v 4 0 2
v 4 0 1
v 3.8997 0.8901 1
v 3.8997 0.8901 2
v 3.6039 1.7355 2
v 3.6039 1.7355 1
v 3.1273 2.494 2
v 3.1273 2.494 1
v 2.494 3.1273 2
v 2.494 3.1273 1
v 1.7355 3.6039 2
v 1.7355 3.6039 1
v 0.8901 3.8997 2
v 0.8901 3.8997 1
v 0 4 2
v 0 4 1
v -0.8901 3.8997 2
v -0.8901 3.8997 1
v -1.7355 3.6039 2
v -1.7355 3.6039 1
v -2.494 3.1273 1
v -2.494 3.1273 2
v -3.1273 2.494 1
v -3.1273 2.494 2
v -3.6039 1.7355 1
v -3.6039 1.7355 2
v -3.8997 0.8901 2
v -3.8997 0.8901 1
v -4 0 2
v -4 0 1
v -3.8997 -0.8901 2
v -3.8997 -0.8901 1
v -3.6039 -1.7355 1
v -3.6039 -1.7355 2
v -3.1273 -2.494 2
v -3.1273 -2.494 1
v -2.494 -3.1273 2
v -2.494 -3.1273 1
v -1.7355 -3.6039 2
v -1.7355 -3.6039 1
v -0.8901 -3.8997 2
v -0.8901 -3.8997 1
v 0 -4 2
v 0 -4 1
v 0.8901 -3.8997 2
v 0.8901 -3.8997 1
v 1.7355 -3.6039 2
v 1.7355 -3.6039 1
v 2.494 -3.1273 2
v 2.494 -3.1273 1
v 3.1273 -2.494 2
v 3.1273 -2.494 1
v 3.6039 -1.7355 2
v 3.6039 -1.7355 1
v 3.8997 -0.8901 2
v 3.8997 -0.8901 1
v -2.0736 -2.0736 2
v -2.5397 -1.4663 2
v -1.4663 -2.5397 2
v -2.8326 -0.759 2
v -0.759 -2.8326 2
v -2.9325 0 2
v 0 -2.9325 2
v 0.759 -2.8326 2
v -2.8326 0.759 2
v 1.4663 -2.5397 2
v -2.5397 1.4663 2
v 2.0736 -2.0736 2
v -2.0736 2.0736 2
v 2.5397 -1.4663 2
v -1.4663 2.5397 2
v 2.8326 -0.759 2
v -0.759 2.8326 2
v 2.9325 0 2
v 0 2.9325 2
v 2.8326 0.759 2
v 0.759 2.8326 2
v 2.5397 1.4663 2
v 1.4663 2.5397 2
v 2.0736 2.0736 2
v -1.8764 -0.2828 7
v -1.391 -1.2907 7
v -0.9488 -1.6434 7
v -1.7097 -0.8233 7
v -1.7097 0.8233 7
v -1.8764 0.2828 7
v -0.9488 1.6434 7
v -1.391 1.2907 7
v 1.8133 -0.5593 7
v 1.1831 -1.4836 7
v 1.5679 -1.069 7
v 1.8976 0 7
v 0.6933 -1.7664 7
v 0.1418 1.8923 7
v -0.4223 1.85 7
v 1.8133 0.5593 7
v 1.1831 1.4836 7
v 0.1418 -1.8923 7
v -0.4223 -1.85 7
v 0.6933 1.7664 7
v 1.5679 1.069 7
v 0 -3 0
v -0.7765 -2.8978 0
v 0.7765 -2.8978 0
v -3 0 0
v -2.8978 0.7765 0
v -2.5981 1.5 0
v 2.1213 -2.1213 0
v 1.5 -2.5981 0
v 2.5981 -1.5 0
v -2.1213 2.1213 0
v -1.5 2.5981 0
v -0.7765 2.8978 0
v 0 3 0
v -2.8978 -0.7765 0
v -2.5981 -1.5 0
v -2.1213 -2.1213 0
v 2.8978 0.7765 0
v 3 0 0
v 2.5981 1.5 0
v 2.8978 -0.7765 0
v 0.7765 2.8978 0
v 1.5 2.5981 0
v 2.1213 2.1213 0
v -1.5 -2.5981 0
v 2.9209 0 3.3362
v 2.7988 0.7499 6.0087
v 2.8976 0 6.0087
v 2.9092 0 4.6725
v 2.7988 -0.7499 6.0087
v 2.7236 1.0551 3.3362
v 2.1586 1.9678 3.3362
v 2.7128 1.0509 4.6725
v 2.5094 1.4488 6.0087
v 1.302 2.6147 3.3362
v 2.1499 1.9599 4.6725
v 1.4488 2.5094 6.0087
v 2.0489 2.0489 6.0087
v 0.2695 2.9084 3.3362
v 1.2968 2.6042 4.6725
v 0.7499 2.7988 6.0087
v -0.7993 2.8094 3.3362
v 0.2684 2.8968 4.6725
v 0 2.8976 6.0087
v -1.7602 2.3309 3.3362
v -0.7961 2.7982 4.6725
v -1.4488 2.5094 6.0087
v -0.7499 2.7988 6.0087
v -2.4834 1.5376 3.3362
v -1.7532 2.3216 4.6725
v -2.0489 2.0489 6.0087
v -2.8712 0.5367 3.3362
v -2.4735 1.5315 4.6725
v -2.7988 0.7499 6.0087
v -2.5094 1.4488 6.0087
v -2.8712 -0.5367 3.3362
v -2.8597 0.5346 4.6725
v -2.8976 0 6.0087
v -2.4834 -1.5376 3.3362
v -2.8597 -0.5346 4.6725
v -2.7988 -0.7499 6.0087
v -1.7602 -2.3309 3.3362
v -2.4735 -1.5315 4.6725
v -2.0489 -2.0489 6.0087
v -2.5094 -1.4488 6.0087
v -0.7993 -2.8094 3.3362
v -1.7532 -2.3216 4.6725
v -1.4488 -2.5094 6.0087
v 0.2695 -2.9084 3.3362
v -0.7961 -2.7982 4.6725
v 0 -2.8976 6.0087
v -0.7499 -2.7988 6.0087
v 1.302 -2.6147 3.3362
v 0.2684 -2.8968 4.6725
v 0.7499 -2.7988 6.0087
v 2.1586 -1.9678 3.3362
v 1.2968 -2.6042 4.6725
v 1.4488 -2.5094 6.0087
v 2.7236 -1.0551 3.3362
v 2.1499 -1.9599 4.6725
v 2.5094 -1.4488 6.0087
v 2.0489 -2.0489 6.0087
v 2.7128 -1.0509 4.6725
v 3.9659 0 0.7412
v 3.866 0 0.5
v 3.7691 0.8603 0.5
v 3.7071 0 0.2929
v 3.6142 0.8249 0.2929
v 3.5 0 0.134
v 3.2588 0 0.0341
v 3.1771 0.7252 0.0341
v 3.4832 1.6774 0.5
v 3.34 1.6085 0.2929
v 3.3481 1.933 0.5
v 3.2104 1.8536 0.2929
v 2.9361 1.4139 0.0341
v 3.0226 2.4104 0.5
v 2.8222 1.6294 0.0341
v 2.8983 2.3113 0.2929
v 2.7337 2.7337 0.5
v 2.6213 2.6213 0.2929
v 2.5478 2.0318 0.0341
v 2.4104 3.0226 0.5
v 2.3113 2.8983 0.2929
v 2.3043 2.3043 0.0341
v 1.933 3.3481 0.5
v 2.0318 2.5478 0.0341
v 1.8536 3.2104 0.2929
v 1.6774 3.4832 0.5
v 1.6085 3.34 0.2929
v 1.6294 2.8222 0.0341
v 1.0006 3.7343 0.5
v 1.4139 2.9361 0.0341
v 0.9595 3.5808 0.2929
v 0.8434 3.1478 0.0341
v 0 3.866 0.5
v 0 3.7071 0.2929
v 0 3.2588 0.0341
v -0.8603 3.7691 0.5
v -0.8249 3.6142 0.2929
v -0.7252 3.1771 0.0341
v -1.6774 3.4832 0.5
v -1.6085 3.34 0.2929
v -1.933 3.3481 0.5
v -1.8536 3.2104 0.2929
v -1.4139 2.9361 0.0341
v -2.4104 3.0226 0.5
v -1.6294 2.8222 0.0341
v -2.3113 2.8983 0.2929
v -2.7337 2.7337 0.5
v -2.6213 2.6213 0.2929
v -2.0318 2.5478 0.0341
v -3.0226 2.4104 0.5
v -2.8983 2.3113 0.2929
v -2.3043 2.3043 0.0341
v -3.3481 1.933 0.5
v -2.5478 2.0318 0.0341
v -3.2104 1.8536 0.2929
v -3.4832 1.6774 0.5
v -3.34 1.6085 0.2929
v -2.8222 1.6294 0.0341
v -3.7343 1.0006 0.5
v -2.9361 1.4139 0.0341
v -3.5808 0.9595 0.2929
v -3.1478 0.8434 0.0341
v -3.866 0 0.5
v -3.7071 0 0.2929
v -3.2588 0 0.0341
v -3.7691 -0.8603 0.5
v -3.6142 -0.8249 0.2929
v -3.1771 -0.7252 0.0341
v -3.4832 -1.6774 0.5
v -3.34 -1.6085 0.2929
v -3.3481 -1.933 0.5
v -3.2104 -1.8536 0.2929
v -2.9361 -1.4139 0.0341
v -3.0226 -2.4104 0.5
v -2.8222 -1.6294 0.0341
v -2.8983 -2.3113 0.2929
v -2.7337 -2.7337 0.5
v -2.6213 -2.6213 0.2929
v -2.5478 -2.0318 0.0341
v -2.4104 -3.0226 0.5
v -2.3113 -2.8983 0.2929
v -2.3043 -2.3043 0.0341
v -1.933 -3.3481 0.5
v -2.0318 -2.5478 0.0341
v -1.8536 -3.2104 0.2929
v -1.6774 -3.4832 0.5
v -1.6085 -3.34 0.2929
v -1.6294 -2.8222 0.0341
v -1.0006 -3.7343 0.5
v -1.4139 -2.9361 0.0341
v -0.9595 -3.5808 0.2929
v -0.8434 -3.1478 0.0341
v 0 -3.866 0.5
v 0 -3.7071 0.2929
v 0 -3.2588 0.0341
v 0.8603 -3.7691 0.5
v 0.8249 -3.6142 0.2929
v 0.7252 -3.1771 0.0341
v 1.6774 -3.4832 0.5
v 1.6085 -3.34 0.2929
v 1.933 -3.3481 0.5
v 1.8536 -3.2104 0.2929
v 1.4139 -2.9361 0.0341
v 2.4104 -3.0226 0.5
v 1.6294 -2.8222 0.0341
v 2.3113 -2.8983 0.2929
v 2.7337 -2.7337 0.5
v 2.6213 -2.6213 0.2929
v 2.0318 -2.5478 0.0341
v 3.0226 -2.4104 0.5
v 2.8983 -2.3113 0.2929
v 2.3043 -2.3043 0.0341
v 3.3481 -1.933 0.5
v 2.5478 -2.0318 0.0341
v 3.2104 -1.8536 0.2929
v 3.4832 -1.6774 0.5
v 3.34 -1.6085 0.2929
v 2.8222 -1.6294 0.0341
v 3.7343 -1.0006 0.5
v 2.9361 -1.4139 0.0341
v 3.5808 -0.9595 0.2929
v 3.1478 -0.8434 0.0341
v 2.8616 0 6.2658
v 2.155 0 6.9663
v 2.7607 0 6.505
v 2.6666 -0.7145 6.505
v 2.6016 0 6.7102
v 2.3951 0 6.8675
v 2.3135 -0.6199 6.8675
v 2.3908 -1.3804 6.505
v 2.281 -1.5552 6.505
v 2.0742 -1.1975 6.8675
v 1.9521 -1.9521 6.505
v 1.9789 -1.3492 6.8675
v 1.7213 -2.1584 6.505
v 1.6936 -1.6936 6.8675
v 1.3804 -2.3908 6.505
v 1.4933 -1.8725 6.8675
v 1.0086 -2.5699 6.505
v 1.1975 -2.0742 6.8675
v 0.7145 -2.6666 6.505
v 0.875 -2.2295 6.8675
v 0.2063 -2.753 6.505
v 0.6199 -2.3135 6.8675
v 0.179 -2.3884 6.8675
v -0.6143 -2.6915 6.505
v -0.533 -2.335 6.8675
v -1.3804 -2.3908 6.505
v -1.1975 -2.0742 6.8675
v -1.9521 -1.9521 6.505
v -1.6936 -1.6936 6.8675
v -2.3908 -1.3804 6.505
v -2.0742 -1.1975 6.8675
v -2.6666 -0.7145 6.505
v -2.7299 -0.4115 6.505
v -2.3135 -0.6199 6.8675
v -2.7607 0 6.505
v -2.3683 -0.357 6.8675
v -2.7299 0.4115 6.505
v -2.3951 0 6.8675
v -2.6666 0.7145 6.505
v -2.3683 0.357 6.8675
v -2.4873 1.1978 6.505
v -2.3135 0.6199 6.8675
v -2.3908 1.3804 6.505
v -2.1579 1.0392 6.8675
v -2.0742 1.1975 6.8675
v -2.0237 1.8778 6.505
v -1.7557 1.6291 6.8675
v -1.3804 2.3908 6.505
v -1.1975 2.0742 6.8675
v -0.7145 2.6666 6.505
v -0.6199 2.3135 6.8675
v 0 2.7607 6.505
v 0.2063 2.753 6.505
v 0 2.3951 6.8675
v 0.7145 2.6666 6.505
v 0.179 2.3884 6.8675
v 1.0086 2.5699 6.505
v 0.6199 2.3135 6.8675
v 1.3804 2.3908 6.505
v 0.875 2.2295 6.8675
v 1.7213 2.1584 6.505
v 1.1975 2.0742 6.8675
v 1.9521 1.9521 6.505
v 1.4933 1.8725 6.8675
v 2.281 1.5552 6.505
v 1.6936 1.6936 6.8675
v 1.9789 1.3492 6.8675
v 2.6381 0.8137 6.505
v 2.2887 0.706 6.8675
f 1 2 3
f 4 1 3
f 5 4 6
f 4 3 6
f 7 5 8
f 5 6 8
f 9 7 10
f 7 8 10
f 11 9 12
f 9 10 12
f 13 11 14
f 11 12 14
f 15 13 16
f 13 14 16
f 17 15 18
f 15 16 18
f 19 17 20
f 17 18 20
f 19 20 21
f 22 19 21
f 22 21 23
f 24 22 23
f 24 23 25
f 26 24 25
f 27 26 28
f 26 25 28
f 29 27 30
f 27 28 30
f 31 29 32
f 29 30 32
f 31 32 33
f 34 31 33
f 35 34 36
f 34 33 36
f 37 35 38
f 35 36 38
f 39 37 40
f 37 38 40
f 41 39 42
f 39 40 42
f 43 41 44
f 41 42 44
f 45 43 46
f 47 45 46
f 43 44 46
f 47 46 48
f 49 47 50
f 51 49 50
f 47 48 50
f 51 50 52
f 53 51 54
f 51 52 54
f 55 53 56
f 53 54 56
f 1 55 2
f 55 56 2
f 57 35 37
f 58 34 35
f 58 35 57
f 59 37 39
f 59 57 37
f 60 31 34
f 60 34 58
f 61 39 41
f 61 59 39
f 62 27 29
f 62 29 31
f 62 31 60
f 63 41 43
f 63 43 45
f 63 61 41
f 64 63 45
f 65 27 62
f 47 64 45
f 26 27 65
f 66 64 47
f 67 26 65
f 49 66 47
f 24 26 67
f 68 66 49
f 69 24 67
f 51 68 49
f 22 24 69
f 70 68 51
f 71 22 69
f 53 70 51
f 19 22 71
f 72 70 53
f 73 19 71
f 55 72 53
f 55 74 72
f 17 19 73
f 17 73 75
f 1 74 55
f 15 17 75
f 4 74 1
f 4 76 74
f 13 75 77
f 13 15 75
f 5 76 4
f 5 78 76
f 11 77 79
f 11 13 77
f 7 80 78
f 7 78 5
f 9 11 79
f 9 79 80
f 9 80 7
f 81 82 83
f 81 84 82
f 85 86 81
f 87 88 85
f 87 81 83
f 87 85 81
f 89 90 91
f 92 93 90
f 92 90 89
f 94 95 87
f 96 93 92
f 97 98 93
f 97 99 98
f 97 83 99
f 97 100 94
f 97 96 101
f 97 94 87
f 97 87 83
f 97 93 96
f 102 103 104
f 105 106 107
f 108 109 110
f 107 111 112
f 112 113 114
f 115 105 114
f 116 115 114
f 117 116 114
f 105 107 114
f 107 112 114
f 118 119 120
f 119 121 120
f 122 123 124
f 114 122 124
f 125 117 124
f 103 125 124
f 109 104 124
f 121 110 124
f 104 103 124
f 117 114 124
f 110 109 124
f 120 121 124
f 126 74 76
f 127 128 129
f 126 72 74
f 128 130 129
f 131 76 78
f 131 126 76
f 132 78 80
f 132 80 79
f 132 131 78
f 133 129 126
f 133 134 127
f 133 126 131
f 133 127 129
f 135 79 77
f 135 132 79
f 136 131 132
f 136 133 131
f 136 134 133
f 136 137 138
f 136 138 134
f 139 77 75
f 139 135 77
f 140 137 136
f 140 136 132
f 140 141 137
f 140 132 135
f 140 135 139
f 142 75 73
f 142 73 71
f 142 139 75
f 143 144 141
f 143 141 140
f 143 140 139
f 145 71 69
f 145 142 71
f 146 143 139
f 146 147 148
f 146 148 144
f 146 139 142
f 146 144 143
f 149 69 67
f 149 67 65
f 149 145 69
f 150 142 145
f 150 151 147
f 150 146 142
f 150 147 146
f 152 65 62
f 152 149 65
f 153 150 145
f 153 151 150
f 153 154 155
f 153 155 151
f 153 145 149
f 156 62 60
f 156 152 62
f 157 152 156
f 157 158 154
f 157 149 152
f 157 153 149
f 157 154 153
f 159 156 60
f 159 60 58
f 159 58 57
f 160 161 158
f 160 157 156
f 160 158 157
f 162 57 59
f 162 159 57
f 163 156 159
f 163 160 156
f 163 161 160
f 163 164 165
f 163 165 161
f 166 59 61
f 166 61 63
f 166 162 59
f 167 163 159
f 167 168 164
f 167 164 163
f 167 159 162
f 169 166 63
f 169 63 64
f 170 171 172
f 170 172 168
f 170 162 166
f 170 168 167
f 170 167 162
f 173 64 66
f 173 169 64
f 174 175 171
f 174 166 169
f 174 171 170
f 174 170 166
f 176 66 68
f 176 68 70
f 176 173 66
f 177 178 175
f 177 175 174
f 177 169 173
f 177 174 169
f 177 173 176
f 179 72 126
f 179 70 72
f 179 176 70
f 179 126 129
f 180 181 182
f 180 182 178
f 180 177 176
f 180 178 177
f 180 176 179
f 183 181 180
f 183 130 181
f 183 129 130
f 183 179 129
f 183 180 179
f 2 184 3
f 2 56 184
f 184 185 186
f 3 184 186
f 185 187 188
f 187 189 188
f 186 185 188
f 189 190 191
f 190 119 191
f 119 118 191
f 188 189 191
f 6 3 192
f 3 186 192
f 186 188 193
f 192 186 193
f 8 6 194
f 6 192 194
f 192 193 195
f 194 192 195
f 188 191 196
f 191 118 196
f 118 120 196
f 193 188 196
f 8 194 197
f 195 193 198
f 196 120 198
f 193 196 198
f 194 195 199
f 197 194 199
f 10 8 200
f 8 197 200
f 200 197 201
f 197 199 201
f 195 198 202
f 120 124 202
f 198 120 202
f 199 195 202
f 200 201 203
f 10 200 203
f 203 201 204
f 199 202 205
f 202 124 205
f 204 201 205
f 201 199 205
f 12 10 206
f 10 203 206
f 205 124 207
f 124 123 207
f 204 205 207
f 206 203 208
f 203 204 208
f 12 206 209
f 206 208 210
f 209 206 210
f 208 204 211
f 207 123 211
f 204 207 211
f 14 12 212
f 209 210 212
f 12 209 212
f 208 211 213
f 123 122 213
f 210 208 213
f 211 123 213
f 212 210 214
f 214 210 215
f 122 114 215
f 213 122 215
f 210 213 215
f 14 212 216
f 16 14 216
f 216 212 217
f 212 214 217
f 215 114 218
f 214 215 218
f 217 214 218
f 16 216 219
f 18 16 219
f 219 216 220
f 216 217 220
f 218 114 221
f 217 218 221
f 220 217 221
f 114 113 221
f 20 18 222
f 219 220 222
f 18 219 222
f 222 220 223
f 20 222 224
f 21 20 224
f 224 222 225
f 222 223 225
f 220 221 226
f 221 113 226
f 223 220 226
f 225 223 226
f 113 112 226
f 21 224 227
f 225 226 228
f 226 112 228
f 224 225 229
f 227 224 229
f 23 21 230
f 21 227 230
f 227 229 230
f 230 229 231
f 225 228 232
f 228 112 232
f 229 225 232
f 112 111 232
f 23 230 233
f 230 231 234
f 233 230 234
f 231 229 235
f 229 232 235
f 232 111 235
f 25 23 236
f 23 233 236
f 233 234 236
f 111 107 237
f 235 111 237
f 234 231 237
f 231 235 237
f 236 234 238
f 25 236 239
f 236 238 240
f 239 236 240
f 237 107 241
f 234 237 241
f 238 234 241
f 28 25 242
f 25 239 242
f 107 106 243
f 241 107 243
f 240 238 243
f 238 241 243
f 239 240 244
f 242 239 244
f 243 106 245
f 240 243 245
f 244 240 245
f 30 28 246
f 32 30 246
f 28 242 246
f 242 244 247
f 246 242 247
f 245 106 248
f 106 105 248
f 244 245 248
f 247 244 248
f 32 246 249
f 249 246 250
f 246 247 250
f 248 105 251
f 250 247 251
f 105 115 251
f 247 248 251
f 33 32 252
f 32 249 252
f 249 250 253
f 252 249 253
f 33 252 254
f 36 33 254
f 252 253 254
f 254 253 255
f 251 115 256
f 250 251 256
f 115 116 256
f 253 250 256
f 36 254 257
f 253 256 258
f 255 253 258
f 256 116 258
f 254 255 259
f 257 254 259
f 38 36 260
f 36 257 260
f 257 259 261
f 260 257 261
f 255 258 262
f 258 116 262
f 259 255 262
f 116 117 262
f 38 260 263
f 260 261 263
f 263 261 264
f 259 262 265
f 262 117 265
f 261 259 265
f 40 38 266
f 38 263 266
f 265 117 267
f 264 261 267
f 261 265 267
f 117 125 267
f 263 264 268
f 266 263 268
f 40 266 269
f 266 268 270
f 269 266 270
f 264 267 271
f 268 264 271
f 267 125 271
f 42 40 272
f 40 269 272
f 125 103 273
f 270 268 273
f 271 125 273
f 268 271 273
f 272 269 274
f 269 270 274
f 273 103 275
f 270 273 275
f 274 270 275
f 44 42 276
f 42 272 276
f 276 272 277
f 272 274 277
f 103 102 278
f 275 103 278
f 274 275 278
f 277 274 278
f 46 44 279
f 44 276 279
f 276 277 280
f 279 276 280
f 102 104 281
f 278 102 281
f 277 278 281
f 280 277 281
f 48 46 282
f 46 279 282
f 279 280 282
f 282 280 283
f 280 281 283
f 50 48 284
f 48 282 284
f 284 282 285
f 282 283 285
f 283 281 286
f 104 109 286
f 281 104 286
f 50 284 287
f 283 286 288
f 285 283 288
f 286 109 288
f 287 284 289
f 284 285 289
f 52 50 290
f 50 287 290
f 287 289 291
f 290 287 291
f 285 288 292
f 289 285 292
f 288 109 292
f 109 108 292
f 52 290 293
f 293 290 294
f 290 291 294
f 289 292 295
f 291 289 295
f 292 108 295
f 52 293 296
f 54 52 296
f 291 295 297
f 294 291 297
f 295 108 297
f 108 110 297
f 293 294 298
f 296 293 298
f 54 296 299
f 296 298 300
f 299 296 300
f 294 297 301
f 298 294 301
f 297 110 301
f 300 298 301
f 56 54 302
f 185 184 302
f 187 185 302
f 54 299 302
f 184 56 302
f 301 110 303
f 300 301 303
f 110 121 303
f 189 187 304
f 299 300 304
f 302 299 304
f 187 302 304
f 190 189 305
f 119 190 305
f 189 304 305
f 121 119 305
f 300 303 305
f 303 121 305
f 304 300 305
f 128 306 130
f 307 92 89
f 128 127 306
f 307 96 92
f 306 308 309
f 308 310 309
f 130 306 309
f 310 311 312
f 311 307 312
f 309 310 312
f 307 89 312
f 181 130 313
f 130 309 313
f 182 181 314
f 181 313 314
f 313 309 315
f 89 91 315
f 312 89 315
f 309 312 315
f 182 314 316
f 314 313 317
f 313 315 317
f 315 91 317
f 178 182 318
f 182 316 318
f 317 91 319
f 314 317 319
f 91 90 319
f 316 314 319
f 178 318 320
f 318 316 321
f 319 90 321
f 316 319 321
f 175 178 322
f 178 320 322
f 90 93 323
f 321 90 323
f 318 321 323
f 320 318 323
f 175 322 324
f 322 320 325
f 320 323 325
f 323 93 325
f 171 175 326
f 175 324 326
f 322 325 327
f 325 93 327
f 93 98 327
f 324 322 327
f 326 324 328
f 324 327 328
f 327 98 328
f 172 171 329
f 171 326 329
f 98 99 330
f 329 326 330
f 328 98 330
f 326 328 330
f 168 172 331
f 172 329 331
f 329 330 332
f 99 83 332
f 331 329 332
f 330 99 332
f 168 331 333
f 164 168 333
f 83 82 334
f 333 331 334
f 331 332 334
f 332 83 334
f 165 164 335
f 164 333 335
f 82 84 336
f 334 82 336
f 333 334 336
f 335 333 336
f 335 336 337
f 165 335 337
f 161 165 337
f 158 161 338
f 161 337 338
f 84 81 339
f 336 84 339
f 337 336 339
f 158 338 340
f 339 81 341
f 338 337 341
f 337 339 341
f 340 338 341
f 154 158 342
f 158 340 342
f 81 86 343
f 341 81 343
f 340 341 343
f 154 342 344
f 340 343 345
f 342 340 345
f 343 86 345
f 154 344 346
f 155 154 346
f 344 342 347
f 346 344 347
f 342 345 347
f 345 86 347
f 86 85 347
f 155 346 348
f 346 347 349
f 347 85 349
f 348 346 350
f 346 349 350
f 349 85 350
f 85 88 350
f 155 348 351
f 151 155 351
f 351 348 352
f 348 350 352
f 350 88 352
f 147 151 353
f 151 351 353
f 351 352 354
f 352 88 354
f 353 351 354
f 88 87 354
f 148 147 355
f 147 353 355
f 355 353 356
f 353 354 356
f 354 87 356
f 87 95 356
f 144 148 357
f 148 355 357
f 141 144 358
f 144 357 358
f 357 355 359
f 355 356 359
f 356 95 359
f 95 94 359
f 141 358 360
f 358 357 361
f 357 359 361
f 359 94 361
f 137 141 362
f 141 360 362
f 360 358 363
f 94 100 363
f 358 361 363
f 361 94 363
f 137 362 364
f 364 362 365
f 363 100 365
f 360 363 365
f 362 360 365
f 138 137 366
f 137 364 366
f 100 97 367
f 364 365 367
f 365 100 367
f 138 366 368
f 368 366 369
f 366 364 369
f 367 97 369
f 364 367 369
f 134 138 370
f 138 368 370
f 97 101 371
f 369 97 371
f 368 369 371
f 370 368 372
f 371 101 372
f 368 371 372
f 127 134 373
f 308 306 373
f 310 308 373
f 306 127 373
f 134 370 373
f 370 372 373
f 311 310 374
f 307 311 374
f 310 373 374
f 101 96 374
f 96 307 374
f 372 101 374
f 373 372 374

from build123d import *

# Parameters (mm, degrees)
F0_R     = 2.95
F1_DEPTH = 7
F1_TAPER = 0.5
F0_R_2   = 4
F2_DEPTH = 2
F3_R     = 1


with BuildPart() as f1:
    # F0 (on Top) → F1 (new body)
    with BuildSketch(Plane.XY):
        Circle(F0_R)
    extrude(amount=F1_DEPTH, taper=F1_TAPER)

    # F0 (on Top) → F2 (join)
    with BuildSketch(Plane.XY):
        Circle(F0_R_2)
        Circle(F0_R, mode=Mode.SUBTRACT)
        Circle(F0_R)
    extrude(amount=F2_DEPTH)

    # F3
    f3_edges = [f1.edges().sort_by_distance(p)[0] for p in [
        (-4, 0, 0),
        (-2.888912, 0, 7),
    ]]
    fillet(f3_edges, radius=F3_R)


solid = f1.part
